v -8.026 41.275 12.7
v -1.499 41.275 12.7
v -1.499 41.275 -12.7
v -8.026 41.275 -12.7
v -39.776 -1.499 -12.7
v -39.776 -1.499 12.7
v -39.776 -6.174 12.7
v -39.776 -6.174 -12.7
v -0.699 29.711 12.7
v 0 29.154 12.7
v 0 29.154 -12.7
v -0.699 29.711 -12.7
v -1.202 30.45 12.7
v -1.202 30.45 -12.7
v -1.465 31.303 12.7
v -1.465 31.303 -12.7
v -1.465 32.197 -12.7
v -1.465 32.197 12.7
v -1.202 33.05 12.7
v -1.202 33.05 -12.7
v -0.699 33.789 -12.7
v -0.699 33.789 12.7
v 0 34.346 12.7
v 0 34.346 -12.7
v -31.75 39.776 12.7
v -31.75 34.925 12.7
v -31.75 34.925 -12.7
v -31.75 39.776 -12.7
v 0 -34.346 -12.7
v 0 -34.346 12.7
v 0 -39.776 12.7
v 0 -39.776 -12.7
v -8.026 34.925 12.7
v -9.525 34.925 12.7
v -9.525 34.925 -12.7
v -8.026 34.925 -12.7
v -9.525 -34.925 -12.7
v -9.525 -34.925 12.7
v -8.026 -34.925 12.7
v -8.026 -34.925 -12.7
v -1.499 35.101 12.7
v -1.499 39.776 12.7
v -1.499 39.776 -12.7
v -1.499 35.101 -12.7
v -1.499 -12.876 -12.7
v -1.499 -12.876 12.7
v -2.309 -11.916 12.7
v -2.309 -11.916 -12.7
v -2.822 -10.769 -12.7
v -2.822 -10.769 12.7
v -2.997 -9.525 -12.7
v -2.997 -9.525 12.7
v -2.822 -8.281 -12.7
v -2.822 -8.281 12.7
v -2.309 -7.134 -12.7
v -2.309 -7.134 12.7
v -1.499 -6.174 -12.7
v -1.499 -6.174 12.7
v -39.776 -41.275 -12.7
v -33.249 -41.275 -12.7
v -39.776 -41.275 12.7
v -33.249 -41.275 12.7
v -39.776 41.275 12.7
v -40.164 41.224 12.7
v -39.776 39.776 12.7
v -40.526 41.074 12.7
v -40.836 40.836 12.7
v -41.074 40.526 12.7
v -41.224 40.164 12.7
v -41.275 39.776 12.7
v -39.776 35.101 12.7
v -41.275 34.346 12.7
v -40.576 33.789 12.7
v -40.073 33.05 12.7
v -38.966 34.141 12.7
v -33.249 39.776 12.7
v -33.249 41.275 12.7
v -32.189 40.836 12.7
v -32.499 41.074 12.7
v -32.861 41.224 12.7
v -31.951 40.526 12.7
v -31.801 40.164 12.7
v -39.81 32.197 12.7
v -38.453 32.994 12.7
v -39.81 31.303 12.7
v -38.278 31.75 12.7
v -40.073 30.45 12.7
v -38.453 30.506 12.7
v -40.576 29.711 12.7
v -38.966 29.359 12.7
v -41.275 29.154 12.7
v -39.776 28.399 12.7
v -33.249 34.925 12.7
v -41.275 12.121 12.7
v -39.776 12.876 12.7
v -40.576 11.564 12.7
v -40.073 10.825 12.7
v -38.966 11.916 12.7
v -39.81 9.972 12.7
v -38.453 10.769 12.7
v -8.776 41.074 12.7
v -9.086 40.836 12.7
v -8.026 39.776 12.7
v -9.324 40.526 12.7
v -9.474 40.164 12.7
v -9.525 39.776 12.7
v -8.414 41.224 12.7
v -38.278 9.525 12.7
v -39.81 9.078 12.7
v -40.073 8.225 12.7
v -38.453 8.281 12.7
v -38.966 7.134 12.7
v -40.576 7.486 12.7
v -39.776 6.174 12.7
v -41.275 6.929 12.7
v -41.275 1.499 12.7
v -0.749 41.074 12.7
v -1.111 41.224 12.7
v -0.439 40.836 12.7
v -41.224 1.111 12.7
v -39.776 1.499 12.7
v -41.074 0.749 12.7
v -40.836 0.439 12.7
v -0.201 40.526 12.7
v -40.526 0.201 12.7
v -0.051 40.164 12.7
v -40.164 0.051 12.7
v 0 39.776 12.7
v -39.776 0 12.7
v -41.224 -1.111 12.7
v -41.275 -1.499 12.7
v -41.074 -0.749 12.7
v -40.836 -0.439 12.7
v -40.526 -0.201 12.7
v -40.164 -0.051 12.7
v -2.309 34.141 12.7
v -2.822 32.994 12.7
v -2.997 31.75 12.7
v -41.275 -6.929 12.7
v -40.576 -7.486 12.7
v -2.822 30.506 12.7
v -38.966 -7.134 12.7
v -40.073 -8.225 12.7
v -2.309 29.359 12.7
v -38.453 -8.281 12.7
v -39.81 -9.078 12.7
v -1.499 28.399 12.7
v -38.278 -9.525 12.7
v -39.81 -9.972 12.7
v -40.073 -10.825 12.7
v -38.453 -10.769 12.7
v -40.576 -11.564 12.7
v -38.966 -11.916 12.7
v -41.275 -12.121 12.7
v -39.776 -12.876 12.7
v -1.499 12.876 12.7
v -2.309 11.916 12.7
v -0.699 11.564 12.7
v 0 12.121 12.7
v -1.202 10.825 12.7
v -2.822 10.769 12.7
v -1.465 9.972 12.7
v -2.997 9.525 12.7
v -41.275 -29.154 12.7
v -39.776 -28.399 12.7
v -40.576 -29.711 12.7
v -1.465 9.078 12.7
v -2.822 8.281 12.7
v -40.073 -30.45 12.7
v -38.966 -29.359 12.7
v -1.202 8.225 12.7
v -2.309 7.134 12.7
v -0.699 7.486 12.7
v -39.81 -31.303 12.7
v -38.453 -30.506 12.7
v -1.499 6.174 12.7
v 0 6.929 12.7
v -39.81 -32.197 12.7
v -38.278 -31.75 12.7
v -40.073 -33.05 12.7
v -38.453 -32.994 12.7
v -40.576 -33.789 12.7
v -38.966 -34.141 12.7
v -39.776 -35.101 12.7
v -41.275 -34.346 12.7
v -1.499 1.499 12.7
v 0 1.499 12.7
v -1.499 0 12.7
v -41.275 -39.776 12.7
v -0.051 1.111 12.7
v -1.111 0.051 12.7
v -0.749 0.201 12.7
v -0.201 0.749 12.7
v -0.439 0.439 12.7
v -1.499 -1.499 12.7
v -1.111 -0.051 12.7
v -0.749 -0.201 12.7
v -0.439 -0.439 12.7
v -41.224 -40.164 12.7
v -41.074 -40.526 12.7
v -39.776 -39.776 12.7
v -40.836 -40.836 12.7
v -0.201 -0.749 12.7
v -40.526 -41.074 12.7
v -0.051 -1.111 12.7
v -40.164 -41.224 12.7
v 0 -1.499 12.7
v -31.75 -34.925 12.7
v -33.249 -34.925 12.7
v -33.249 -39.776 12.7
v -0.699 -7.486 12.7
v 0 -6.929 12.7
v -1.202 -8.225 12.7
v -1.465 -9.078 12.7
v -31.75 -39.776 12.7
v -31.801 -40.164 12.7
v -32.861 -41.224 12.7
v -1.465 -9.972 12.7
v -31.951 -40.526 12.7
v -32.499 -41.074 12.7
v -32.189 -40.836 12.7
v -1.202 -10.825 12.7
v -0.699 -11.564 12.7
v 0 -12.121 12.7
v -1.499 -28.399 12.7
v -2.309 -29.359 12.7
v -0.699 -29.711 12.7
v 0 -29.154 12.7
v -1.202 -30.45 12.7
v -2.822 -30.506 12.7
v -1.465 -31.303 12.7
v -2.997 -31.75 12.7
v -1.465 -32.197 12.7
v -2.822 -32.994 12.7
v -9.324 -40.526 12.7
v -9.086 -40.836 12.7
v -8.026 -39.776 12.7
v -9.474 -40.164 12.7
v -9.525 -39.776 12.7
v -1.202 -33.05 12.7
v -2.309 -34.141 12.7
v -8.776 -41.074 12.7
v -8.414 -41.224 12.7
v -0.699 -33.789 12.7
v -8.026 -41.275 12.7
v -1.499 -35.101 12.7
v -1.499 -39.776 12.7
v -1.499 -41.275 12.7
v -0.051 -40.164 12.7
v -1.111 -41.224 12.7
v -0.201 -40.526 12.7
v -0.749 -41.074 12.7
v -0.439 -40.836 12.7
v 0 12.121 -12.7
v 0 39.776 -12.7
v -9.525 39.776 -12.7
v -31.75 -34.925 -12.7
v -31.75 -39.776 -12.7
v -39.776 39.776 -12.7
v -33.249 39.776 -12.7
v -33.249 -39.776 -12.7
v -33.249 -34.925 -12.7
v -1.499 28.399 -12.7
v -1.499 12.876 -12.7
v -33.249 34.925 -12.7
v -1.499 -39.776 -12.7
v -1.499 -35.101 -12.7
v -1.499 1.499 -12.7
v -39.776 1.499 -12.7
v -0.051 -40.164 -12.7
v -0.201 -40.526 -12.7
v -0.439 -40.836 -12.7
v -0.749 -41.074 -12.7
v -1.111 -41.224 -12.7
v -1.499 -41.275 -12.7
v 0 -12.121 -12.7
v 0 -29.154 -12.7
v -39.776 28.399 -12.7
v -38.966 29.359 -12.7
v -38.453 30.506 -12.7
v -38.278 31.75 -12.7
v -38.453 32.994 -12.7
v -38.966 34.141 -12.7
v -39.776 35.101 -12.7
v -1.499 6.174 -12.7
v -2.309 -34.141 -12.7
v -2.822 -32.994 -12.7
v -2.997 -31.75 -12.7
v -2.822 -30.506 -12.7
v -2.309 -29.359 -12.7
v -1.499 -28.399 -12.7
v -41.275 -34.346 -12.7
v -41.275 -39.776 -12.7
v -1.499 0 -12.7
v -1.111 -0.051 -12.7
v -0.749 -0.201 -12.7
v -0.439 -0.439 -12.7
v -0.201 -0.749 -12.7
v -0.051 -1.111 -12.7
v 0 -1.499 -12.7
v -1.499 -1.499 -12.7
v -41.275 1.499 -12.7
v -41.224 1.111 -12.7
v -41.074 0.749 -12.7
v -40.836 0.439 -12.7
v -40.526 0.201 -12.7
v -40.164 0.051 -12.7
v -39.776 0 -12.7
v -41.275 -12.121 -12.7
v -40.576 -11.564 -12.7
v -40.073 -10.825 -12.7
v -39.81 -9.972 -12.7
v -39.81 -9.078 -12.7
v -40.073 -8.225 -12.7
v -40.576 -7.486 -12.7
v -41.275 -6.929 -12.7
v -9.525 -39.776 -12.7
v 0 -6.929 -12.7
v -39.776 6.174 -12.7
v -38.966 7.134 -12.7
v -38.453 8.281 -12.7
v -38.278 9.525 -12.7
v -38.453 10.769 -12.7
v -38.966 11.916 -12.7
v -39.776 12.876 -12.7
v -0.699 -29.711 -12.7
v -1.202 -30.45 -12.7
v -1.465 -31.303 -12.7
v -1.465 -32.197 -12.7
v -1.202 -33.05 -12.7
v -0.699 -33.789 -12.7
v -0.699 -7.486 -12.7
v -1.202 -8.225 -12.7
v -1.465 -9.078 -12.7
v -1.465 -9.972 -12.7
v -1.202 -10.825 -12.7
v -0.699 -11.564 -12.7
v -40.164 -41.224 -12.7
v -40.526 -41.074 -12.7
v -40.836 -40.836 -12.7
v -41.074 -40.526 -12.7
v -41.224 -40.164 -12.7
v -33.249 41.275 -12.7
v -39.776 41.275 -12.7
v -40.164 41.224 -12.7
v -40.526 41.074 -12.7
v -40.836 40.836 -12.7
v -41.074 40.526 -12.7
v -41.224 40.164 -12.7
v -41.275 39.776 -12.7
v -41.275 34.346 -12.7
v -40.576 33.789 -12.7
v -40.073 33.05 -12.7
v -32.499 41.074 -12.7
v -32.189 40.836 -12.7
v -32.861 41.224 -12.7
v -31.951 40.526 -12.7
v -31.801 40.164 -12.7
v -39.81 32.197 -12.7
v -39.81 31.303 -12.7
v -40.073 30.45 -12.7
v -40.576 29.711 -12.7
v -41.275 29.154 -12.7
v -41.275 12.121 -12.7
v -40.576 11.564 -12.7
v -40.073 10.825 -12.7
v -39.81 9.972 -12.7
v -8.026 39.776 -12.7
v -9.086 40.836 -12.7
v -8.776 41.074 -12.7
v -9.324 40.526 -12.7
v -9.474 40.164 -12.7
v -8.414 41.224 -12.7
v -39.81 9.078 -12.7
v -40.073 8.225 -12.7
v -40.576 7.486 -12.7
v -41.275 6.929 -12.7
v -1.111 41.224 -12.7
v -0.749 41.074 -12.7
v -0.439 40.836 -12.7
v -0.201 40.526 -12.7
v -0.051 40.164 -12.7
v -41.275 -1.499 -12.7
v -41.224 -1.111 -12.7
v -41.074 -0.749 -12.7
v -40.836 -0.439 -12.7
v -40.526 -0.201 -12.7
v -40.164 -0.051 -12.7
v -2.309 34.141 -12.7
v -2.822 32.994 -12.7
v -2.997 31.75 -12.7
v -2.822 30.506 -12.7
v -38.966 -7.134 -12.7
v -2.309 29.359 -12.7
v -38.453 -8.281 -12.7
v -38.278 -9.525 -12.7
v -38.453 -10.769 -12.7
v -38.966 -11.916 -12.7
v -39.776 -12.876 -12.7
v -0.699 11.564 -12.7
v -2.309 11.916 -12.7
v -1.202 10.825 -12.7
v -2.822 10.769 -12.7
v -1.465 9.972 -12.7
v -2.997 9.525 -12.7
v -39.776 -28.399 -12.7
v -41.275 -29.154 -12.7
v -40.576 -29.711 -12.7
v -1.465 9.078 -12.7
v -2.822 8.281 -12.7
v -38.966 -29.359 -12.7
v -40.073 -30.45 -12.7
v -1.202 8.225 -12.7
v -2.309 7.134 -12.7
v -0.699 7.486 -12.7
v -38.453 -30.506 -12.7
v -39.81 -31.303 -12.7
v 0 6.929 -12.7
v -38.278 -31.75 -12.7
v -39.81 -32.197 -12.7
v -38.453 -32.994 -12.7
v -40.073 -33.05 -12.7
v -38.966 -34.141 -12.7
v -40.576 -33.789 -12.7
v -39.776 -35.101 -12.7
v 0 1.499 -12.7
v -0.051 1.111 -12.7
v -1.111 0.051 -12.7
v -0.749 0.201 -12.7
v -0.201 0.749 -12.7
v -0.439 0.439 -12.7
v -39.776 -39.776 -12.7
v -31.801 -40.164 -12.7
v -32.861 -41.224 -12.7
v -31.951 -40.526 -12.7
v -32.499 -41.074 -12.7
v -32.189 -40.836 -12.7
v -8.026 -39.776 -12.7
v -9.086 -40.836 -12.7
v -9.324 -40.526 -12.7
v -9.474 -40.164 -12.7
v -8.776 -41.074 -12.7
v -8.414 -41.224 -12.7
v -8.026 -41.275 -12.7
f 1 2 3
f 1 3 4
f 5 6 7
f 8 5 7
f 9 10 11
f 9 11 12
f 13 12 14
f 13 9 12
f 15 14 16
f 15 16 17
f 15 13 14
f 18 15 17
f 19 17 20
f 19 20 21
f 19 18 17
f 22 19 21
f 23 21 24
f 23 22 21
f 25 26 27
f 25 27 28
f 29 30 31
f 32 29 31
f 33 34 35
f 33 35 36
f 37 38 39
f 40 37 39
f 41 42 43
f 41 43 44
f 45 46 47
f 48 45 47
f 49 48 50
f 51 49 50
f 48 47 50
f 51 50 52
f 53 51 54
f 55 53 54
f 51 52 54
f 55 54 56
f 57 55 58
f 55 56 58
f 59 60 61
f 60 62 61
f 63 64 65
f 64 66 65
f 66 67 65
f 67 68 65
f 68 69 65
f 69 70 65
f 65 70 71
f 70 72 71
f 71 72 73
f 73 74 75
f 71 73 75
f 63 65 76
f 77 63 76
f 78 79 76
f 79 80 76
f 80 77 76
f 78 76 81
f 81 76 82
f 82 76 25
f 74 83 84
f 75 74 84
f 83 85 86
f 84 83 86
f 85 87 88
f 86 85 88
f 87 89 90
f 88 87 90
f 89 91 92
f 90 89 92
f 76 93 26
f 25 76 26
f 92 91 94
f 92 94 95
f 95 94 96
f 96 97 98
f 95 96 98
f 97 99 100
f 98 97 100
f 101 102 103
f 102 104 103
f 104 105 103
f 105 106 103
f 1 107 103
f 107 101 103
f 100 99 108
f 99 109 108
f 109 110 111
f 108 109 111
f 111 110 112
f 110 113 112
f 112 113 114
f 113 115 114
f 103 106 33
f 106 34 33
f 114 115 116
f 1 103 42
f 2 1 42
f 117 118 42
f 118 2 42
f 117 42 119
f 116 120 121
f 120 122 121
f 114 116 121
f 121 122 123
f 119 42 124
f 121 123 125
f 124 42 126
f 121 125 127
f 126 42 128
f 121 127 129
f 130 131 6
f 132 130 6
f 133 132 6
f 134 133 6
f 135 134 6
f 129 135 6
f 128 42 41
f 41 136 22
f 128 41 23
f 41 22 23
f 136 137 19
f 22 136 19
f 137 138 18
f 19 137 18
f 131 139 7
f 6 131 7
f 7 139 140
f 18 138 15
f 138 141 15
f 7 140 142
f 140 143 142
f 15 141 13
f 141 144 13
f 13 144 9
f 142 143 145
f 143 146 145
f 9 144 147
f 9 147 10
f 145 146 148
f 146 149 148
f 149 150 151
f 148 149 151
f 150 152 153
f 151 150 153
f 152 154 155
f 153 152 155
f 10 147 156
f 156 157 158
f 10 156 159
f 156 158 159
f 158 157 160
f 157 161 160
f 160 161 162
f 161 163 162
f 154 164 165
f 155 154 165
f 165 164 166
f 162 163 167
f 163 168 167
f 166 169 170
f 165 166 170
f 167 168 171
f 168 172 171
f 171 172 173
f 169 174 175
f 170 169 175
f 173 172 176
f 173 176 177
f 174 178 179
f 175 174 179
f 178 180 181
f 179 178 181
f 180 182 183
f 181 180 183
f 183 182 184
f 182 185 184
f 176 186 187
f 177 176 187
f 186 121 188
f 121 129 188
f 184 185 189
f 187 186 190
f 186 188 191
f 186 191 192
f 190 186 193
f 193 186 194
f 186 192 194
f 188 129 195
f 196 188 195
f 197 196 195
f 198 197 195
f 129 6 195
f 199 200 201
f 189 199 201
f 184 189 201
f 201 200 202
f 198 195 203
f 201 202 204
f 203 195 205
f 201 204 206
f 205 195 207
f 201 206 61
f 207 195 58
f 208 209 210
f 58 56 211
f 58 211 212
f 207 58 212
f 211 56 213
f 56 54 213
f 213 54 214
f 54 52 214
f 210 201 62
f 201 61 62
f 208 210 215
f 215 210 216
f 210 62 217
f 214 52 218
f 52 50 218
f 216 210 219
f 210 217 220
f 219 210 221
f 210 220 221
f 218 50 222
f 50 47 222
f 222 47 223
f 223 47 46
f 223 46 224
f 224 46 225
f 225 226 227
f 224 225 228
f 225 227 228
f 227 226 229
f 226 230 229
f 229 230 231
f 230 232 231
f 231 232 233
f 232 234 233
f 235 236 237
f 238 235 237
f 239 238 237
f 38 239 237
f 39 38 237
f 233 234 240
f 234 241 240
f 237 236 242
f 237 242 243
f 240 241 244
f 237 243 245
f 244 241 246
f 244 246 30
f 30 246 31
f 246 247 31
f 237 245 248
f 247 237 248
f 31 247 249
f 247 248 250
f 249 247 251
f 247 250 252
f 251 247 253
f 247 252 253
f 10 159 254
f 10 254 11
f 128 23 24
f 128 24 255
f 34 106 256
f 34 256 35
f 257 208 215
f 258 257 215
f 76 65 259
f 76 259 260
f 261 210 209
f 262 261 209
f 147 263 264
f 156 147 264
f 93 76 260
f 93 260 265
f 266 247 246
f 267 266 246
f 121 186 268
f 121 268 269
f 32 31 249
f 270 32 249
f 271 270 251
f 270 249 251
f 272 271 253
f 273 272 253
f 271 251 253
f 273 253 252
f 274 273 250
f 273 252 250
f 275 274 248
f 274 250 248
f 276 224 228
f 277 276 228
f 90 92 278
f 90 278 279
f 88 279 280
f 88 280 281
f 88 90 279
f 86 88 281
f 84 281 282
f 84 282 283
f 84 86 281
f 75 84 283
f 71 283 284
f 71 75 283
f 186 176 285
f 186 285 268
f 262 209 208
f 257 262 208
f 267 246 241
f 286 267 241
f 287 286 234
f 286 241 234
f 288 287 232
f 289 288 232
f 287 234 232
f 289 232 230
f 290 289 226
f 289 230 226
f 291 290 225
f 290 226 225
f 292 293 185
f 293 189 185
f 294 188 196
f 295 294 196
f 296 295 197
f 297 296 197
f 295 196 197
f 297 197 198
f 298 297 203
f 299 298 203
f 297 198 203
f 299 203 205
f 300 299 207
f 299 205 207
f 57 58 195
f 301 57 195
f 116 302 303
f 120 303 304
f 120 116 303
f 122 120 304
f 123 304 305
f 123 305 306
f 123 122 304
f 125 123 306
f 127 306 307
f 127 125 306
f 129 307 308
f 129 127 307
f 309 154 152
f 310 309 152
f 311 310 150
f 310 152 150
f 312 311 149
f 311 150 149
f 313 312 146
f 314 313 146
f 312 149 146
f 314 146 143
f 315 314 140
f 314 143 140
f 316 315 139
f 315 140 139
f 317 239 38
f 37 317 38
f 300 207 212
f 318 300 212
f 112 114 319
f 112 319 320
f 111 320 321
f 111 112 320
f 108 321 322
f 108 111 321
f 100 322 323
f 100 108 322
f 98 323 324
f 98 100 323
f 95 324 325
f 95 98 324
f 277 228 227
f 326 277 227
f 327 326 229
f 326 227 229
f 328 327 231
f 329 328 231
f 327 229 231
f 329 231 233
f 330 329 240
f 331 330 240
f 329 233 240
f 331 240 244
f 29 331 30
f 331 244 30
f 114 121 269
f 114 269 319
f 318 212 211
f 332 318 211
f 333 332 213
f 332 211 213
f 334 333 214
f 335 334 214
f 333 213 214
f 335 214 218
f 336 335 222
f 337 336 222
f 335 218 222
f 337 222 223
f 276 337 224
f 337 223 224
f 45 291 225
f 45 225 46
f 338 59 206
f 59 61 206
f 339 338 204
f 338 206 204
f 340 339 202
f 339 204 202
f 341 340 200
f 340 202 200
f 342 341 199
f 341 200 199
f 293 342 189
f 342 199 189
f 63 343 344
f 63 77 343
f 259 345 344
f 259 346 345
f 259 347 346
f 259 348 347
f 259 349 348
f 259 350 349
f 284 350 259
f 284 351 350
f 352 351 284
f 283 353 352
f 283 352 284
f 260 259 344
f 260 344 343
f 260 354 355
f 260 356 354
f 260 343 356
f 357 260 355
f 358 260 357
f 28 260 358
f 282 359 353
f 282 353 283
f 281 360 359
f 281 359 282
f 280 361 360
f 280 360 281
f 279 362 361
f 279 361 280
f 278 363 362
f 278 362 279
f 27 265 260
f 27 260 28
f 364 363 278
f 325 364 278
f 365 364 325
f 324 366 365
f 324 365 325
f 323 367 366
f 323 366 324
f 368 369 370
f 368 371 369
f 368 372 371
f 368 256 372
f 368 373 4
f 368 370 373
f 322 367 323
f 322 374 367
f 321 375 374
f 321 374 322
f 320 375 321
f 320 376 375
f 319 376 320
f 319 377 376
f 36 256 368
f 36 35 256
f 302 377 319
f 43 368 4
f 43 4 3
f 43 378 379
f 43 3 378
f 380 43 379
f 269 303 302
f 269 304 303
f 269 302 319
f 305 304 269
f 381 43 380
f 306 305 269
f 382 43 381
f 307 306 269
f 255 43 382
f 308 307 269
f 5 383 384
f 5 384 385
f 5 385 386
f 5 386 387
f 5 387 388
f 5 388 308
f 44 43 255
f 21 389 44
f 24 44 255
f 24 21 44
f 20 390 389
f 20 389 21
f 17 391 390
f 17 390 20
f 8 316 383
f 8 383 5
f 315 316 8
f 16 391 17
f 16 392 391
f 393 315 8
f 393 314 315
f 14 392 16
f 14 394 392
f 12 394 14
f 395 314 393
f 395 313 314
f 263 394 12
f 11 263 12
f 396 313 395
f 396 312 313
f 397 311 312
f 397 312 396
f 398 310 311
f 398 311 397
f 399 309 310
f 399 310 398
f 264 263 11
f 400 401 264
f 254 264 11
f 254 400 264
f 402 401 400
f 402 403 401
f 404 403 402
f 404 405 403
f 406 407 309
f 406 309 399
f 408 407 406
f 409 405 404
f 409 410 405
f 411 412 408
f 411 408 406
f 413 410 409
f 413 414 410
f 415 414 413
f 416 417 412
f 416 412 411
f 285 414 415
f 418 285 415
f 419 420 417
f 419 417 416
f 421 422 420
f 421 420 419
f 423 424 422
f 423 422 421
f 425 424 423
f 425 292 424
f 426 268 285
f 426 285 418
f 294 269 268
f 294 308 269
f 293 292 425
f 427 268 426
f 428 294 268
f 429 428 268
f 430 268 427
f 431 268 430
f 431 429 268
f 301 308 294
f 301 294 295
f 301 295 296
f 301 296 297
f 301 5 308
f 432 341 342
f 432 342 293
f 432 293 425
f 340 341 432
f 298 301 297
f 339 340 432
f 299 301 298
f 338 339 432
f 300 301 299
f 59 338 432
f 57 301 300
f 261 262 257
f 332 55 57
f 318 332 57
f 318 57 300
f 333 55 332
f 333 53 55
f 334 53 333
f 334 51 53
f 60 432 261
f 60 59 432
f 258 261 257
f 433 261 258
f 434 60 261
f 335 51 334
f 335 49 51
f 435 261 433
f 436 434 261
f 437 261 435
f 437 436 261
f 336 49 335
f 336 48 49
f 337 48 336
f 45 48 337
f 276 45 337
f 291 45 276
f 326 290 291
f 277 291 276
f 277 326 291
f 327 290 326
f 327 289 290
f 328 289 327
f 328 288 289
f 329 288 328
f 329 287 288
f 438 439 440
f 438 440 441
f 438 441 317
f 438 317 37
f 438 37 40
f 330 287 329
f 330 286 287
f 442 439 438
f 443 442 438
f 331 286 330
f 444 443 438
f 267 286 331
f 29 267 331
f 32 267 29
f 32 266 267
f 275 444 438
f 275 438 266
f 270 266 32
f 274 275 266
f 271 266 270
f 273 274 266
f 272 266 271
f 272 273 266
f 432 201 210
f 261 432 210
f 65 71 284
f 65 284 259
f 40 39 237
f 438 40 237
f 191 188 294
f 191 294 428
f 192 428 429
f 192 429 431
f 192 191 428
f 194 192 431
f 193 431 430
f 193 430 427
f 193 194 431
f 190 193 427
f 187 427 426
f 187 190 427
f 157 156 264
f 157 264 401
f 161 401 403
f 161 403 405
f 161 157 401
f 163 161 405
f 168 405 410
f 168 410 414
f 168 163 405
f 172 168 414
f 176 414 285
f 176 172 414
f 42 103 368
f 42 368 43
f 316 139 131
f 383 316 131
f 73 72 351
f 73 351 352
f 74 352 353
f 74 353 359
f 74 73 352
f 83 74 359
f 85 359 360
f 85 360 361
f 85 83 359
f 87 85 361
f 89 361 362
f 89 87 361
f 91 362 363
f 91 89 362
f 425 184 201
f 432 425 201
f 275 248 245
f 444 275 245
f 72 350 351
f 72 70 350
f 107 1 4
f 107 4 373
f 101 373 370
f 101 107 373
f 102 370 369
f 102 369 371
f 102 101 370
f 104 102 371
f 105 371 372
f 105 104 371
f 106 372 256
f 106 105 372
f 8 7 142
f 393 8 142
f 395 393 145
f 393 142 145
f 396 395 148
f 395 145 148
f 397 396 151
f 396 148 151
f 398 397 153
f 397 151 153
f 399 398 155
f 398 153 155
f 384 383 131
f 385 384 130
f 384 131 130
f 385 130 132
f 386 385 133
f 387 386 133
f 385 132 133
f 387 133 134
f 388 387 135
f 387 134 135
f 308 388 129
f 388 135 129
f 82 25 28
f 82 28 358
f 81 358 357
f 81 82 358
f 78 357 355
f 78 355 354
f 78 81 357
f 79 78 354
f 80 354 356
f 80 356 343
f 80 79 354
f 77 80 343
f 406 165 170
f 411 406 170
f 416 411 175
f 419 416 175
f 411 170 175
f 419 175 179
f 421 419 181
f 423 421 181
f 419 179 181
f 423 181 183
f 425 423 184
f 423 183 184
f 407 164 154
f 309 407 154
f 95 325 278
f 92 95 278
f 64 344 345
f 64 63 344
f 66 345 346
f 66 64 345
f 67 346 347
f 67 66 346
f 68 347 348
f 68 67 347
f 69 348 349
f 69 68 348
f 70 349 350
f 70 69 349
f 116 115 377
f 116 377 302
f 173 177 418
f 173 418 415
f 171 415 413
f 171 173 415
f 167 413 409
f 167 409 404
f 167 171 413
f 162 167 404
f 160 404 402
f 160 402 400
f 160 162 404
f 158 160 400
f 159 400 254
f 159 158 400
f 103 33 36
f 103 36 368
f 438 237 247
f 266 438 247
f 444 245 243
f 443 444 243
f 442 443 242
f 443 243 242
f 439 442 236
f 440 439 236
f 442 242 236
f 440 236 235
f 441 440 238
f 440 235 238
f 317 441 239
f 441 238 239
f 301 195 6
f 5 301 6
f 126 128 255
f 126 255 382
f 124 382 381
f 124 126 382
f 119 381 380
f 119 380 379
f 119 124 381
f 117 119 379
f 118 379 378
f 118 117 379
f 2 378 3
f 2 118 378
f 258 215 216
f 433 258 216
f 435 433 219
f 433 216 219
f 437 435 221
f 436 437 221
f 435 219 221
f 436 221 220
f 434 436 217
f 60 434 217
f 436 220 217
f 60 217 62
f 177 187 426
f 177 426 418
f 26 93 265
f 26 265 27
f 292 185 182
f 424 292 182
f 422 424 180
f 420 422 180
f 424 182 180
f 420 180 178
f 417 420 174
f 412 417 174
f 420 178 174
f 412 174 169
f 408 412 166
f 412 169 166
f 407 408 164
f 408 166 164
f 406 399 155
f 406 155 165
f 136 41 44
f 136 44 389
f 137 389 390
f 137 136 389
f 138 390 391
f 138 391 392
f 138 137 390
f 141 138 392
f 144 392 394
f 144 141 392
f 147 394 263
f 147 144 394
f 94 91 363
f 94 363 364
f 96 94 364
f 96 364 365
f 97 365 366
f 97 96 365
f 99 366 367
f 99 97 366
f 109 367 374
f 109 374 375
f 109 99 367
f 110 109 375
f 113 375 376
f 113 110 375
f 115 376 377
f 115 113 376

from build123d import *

# Parameters (mm, degrees)
BASE_EXTRUDE_DEPTH = 12.7


with BuildPart() as part:
    # Sketch1 → Base-Extrude (new, symmetric)
    with BuildSketch(Plane.XY):
        with BuildLine():
            Line((-41.275, 39.7764), (-41.275, 34.34565134))
            ThreePointArc((-41.275, 34.34565134), (-39.7764, 31.75), (-41.275, 29.15434866))
            Line((-41.275, 29.15434866), (-41.275, 12.12065134))
            ThreePointArc((-41.275, 12.12065134), (-39.7764, 9.525), (-41.275, 6.92934866))
            Line((-41.275, 6.92934866), (-41.275, 1.4986))
            ThreePointArc((-41.275, 1.4986), (-40.836070222, 0.438929778), (-39.7764, 0))
            Line((-39.7764, 0), (-1.4986, 0))
            ThreePointArc((-1.4986, 0), (-0.438929778, 0.438929778), (0, 1.4986))
            Line((0, 1.4986), (0, 6.92934866))
            ThreePointArc((0, 6.92934866), (-1.4986, 9.525), (0, 12.12065134))
            Line((0, 12.12065134), (0, 29.15434866))
            ThreePointArc((0, 29.15434866), (-1.4986, 31.75), (0, 34.34565134))
            Line((0, 34.34565134), (0, 39.7764))
            ThreePointArc((0, 39.7764), (-0.438929778, 40.836070222), (-1.4986, 41.275))
            Line((-1.4986, 41.275), (-8.0264, 41.275))
            ThreePointArc((-8.0264, 41.275), (-9.086070222, 40.836070222), (-9.525, 39.7764))
            Line((-9.525, 39.7764), (-9.525, 34.925))
            Line((-9.525, 34.925), (-8.0264, 34.925))
            Line((-8.0264, 34.925), (-8.0264, 39.7764))
            Line((-8.0264, 39.7764), (-1.4986, 39.7764))
            Line((-1.4986, 39.7764), (-1.4986, 35.100971471))
            ThreePointArc((-1.4986, 35.100971471), (-2.9972, 31.75), (-1.4986, 28.399028529))
            Line((-1.4986, 28.399028529), (-1.4986, 12.875971471))
            ThreePointArc((-1.4986, 12.875971471), (-2.9972, 9.525), (-1.4986, 6.174028529))
            Line((-1.4986, 6.174028529), (-1.4986, 1.4986))
            Line((-1.4986, 1.4986), (-39.7764, 1.4986))
            Line((-39.7764, 1.4986), (-39.7764, 6.174028529))
            ThreePointArc((-39.7764, 6.174028529), (-38.2778, 9.525), (-39.7764, 12.875971471))
            Line((-39.7764, 12.875971471), (-39.7764, 28.399028529))
            ThreePointArc((-39.7764, 28.399028529), (-38.2778, 31.75), (-39.7764, 35.100971471))
            Line((-39.7764, 35.100971471), (-39.7764, 39.7764))
            Line((-39.7764, 39.7764), (-33.2486, 39.7764))
            Line((-33.2486, 39.7764), (-33.2486, 34.925))
            Line((-33.2486, 34.925), (-31.75, 34.925))
            Line((-31.75, 34.925), (-31.75, 39.7764))
            ThreePointArc((-31.75, 39.7764), (-32.188929778, 40.836070222), (-33.2486, 41.275))
            Line((-33.2486, 41.275), (-39.7764, 41.275))
            ThreePointArc((-39.7764, 41.275), (-40.836070222, 40.836070222), (-41.275, 39.7764))
        make_face()
    base_extrude = extrude(amount=BASE_EXTRUDE_DEPTH, both=True)

    # Mirror1: Base-Extrude across plane
    add(base_extrude.mirror(Plane.ZX))


solid = part.part
